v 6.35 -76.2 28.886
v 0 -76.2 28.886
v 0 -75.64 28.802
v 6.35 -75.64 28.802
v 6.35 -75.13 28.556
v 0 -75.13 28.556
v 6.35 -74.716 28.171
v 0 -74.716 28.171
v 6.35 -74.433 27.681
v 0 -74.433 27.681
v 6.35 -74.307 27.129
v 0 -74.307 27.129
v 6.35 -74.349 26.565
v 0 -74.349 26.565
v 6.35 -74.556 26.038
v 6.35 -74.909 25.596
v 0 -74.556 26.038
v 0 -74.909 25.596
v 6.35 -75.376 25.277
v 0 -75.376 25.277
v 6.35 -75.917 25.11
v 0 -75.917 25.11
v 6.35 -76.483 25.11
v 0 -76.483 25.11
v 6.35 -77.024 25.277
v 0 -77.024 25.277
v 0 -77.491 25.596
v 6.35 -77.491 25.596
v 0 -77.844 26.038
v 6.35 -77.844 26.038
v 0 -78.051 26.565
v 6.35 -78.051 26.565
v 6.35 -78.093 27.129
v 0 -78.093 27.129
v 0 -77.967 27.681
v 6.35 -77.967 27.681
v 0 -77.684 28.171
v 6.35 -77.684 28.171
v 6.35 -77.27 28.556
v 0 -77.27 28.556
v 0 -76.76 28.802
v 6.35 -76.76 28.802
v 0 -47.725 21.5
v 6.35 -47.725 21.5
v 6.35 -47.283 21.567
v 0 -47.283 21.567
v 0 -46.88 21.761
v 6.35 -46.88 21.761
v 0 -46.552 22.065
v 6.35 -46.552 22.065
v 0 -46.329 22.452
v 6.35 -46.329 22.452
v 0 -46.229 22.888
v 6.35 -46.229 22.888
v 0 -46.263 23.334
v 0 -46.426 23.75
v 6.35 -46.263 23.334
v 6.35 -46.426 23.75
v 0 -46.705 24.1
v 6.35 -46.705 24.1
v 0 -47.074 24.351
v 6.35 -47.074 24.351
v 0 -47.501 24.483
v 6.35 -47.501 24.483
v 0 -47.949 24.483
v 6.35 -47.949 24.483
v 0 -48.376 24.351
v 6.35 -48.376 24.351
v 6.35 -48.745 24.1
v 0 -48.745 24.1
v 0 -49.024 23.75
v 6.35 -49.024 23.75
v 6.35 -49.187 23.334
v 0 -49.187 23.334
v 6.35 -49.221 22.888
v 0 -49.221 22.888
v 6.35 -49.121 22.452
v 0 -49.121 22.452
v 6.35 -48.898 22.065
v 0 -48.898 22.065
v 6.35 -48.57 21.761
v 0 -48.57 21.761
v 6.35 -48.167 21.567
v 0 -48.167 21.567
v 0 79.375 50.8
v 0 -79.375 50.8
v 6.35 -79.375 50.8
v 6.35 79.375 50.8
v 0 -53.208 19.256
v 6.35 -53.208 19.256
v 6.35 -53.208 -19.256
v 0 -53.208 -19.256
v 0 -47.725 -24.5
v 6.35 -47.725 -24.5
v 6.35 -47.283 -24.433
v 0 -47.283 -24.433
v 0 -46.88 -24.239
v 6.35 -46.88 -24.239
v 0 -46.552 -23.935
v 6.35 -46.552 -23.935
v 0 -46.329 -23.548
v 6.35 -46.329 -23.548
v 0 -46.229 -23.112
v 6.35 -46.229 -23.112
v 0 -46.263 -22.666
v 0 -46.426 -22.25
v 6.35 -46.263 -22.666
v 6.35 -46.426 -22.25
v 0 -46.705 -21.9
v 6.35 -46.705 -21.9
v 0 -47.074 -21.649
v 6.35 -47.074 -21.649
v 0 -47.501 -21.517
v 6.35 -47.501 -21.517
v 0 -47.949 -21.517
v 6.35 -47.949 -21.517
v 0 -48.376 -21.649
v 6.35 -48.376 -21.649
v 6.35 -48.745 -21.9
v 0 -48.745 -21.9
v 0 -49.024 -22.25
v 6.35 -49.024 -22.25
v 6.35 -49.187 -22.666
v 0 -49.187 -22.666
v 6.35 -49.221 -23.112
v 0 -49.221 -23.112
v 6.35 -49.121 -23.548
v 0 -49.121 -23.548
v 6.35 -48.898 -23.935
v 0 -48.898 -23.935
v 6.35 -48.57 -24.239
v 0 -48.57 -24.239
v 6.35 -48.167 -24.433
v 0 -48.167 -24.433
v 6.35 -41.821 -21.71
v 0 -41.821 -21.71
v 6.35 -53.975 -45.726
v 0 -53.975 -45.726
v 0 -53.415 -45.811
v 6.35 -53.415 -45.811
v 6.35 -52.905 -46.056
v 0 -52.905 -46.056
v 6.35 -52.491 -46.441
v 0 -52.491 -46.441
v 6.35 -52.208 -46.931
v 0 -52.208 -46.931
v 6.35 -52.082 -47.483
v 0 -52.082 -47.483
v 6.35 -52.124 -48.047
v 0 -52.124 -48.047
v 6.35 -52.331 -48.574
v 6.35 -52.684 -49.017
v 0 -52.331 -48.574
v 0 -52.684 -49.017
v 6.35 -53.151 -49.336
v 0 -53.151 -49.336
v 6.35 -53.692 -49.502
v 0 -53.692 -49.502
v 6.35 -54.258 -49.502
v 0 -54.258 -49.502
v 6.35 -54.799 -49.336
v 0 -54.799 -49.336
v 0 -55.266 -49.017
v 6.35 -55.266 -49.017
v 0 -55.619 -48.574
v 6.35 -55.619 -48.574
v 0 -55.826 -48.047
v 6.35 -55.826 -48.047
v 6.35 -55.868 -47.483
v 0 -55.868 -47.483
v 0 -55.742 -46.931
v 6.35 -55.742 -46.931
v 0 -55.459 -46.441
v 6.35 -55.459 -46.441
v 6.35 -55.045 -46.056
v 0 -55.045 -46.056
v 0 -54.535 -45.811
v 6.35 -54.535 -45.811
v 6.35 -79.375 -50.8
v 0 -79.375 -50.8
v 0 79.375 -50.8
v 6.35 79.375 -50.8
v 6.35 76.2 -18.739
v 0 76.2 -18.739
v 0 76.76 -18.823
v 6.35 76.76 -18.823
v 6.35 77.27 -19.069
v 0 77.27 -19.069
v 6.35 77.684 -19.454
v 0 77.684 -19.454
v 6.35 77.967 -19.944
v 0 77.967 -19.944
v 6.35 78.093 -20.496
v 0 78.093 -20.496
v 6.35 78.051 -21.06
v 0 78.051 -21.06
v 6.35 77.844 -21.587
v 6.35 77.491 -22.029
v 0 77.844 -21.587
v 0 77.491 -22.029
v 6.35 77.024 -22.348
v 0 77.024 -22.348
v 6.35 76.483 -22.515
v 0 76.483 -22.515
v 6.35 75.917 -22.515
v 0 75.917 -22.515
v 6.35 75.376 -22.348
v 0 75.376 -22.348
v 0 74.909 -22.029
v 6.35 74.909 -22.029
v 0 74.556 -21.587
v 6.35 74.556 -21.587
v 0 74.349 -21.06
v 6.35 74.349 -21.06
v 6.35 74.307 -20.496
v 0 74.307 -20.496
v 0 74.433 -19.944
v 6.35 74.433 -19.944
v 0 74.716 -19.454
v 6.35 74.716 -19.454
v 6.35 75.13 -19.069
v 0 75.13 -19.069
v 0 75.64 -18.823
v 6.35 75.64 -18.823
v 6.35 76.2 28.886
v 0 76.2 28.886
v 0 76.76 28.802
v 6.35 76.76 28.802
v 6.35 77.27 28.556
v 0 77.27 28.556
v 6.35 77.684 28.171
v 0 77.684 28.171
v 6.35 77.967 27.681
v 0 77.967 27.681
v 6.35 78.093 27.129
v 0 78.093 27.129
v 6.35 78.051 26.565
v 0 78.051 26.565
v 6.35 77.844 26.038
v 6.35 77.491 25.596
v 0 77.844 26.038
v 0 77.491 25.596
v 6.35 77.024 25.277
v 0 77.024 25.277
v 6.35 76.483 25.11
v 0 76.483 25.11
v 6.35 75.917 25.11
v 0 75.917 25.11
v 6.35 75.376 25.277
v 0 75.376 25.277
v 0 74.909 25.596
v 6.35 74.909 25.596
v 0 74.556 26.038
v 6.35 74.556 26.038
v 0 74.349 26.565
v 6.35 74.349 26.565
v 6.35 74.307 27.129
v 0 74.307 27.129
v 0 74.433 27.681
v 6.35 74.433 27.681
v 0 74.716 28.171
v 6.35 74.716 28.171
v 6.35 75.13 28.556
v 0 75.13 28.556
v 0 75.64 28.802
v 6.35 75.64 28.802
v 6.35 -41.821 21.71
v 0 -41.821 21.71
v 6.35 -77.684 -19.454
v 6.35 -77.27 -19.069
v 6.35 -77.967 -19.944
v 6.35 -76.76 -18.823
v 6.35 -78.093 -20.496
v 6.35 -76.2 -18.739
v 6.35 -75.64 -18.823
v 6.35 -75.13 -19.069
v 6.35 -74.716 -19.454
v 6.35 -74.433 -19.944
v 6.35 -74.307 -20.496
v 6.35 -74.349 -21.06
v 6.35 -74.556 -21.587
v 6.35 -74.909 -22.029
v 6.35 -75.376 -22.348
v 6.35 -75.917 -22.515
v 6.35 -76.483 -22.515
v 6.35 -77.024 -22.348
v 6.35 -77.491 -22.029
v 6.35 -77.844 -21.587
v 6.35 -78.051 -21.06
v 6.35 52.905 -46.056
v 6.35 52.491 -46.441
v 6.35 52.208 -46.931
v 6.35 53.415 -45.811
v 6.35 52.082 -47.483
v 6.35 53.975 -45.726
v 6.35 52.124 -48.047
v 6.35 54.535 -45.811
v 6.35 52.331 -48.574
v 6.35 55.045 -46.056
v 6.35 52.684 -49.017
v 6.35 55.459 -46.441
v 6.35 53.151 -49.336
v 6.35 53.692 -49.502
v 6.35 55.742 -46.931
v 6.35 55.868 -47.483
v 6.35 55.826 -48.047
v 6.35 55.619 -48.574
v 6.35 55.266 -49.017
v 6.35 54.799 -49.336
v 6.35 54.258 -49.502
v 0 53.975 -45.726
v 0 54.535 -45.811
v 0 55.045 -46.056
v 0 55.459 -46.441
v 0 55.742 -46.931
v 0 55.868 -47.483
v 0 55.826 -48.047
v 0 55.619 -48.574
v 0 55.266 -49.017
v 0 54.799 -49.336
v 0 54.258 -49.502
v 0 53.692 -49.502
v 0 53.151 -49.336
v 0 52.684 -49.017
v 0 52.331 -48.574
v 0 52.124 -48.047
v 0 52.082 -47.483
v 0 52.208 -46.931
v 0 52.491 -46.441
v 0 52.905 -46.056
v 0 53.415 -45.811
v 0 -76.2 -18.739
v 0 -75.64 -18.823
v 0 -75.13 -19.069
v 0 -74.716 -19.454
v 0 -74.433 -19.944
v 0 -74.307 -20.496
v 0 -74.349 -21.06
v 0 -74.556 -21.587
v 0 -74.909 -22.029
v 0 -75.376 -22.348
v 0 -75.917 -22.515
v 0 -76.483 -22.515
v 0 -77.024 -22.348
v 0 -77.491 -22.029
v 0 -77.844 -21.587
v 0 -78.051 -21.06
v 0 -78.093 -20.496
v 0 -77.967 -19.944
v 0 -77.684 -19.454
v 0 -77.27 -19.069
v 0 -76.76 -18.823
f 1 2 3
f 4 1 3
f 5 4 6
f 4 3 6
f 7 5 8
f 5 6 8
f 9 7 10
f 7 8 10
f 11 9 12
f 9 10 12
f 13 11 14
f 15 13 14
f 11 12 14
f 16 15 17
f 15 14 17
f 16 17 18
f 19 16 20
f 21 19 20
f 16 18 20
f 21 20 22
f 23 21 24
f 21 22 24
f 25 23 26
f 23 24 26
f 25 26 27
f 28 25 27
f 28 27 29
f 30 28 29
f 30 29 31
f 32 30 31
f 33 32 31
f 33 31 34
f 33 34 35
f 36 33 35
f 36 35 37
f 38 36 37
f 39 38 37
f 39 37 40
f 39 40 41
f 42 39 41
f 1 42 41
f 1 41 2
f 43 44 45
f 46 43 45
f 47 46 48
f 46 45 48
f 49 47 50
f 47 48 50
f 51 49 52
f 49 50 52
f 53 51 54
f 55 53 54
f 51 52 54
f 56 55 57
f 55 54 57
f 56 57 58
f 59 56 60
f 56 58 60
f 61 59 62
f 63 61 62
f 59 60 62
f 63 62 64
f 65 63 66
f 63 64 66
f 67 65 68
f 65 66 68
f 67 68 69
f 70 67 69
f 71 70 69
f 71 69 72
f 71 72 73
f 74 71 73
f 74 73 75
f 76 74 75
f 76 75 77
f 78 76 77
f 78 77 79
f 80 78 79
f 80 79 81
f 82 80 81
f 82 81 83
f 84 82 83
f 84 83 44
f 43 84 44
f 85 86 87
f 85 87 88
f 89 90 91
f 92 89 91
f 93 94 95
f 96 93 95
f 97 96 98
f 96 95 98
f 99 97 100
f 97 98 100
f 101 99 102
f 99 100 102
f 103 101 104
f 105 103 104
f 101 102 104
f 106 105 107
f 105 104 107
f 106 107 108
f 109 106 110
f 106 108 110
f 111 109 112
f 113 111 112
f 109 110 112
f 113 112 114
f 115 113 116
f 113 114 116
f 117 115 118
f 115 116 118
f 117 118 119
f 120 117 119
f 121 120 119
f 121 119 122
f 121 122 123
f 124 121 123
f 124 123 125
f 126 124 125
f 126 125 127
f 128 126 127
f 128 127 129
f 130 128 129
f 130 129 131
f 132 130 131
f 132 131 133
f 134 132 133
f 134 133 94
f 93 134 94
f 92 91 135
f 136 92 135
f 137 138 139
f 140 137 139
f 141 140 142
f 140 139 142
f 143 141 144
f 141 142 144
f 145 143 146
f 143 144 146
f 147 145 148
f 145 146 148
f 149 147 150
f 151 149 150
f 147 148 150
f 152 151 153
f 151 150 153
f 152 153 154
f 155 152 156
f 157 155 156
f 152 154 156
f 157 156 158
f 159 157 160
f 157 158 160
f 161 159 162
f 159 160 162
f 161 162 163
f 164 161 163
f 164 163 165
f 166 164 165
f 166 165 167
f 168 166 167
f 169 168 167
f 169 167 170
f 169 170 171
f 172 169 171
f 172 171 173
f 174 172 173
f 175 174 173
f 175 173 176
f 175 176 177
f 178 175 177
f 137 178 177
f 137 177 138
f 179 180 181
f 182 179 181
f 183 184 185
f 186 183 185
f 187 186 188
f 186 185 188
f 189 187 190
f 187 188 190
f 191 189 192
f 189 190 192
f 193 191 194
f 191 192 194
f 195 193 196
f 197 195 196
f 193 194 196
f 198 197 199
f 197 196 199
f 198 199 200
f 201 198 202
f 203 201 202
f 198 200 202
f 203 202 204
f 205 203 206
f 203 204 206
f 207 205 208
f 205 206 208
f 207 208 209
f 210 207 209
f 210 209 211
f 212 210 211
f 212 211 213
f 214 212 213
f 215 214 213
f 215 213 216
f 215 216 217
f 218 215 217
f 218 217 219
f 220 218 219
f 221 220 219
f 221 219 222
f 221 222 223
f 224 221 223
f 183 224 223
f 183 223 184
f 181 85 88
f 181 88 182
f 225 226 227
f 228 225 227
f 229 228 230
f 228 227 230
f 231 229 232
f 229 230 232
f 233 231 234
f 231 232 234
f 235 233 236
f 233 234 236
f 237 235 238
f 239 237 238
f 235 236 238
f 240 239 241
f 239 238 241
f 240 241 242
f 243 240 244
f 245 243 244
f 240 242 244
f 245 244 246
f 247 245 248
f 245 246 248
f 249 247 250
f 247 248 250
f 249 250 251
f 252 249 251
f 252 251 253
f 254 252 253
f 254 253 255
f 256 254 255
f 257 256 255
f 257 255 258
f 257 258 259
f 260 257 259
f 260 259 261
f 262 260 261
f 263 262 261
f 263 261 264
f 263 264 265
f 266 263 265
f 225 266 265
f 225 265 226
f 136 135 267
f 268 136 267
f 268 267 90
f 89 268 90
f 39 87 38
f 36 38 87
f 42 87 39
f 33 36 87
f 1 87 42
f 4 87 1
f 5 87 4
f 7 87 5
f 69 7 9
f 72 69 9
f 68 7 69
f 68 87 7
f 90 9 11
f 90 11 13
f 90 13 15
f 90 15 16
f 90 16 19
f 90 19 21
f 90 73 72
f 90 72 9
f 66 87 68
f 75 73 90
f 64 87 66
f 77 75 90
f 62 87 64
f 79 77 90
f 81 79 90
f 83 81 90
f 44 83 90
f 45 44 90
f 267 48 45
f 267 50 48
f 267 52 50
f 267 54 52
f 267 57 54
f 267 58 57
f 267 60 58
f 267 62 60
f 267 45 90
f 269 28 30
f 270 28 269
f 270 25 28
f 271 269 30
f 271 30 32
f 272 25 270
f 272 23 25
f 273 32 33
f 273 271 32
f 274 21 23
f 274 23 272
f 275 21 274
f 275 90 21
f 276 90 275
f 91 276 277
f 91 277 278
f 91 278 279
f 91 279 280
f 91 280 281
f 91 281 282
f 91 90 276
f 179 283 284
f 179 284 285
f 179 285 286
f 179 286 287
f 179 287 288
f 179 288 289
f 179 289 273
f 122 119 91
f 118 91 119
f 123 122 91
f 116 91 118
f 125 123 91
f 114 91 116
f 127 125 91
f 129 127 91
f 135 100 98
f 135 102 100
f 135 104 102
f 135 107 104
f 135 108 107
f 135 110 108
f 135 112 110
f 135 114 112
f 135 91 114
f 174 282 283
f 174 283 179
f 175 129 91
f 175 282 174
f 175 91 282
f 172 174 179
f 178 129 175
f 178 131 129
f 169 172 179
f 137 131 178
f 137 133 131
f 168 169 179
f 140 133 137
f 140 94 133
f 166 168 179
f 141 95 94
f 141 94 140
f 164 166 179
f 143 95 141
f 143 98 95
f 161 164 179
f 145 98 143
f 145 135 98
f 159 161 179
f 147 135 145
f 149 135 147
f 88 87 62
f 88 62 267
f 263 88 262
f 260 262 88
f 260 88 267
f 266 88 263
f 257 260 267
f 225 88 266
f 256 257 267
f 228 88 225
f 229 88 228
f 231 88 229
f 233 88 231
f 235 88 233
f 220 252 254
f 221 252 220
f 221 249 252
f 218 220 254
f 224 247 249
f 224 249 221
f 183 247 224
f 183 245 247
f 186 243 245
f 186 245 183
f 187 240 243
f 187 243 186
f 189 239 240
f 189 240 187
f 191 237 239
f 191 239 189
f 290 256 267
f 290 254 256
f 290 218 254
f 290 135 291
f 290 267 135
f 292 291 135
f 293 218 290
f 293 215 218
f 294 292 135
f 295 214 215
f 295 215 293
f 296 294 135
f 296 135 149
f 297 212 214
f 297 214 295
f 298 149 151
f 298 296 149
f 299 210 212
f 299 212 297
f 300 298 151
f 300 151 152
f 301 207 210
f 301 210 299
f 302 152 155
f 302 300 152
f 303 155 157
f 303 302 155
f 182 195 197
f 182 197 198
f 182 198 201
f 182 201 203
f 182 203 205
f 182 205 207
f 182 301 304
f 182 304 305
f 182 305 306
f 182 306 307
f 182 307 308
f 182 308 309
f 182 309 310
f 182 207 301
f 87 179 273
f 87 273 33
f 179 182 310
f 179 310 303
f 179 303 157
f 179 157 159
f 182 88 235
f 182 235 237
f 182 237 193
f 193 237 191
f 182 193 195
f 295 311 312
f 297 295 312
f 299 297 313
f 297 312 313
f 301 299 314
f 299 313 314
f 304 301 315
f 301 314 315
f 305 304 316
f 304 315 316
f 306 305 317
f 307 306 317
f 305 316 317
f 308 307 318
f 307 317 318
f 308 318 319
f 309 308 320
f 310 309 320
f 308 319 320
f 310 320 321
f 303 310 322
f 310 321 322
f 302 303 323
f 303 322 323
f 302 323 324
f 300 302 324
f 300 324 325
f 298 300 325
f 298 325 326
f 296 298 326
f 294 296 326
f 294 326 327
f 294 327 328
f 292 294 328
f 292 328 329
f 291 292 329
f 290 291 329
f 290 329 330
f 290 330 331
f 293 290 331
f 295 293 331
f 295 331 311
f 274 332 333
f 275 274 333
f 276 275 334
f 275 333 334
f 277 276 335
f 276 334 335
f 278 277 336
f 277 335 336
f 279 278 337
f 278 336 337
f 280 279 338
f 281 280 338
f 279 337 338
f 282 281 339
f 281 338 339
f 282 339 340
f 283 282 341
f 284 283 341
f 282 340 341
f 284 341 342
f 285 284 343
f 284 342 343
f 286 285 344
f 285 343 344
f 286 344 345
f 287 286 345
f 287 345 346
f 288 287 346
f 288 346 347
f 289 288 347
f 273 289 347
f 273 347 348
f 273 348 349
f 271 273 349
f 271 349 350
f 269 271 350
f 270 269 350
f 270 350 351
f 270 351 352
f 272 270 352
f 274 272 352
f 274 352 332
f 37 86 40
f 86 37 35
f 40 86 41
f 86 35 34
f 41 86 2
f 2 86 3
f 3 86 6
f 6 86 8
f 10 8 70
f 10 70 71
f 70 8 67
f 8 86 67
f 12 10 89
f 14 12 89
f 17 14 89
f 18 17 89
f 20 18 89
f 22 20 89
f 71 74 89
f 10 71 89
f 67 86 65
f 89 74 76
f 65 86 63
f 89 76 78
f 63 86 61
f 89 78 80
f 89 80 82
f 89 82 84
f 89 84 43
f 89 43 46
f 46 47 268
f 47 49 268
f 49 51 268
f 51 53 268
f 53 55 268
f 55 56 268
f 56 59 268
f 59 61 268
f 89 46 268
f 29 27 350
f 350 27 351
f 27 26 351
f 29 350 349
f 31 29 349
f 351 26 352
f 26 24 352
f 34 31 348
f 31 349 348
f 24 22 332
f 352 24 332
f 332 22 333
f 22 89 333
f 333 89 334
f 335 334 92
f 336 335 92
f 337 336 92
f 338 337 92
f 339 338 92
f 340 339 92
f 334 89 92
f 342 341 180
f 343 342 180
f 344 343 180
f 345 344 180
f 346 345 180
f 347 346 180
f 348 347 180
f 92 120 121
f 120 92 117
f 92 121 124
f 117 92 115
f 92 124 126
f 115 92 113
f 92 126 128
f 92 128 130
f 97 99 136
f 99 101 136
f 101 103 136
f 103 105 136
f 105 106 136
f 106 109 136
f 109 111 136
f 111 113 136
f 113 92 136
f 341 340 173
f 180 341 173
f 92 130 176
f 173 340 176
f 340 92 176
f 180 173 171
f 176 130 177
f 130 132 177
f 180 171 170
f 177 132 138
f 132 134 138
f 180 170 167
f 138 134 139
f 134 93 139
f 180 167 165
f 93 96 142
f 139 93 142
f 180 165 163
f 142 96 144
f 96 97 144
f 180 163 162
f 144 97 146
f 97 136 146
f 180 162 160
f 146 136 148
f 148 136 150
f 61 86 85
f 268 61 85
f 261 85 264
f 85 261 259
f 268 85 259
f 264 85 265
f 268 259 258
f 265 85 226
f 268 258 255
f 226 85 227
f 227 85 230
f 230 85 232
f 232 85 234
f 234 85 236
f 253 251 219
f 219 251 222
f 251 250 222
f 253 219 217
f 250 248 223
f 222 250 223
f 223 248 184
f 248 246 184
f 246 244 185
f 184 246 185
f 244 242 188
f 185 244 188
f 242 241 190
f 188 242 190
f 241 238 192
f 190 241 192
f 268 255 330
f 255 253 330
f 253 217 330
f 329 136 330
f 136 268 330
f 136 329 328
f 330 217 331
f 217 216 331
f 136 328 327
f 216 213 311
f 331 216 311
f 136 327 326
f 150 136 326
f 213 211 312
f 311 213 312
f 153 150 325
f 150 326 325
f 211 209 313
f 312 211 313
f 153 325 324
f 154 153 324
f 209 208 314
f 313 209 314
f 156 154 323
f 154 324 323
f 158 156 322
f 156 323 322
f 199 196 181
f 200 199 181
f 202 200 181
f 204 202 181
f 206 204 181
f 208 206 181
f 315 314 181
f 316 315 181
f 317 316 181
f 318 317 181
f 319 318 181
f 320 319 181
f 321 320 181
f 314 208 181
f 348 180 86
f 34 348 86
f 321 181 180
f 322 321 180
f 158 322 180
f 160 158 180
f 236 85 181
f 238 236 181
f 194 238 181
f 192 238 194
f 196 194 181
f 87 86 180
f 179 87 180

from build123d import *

# Parameters (mm, degrees)
SKETCH1_W             = 101.6
SKETCH1_H             = 158.75
BOSS_EXTRUDE1_DEPTH   = 6.35
SKETCH2_R             = 1.5
CUT_EXTRUDE1_DEPTH    = 95.452914857
CUT_EXTRUDE2_DEPTH    = 95.452914857
F_6_CLEARANCE_HOLE1_D = 3.7973


with BuildPart() as part:
    # Sketch1 → Boss-Extrude1 (new body)
    with BuildSketch(Plane(origin=(0, 0, 0), x_dir=(0, 0, -1), z_dir=(1, 0, 0))):
        Rectangle(SKETCH1_W, SKETCH1_H)
    extrude(amount=BOSS_EXTRUDE1_DEPTH)

    # Sketch2 → Cut-Extrude1 (cut, through all)
    with BuildSketch(Plane(origin=(6.35, 0, 0), x_dir=(0, 0, -1), z_dir=(1, 0, 0))):
        with Locations((23, -47.725)):
            Circle(SKETCH2_R)
        with Locations((-23, -47.725)):
            Circle(SKETCH2_R)
    extrude(amount=-CUT_EXTRUDE1_DEPTH, mode=Mode.SUBTRACT)

    # Sketch3 → Cut-Extrude2 (cut, through all)
    with BuildSketch(Plane(origin=(6.35, 0, 0), x_dir=(0, 0, -1), z_dir=(1, 0, 0))):
        Polygon((-21.709996503, -41.820570024), (-19.255793917, -53.208070024), (19.255793917, -53.208070024), (21.709996503, -41.820570024), align=None)
    extrude(amount=-CUT_EXTRUDE2_DEPTH, mode=Mode.SUBTRACT)

    # #6 Clearance Hole1 (through all)
    with Locations(Plane(origin=(6.35, 0, 0), x_dir=(0, 0, -1), z_dir=(1, 0, 0))):
        with Locations((47.625, -53.975), (-26.9875, 76.2), (20.6375, 76.2), (-26.9875, -76.2), (20.6375, -76.2), (47.625, 53.975)):
            Hole(F_6_CLEARANCE_HOLE1_D / 2)


solid = part.part
